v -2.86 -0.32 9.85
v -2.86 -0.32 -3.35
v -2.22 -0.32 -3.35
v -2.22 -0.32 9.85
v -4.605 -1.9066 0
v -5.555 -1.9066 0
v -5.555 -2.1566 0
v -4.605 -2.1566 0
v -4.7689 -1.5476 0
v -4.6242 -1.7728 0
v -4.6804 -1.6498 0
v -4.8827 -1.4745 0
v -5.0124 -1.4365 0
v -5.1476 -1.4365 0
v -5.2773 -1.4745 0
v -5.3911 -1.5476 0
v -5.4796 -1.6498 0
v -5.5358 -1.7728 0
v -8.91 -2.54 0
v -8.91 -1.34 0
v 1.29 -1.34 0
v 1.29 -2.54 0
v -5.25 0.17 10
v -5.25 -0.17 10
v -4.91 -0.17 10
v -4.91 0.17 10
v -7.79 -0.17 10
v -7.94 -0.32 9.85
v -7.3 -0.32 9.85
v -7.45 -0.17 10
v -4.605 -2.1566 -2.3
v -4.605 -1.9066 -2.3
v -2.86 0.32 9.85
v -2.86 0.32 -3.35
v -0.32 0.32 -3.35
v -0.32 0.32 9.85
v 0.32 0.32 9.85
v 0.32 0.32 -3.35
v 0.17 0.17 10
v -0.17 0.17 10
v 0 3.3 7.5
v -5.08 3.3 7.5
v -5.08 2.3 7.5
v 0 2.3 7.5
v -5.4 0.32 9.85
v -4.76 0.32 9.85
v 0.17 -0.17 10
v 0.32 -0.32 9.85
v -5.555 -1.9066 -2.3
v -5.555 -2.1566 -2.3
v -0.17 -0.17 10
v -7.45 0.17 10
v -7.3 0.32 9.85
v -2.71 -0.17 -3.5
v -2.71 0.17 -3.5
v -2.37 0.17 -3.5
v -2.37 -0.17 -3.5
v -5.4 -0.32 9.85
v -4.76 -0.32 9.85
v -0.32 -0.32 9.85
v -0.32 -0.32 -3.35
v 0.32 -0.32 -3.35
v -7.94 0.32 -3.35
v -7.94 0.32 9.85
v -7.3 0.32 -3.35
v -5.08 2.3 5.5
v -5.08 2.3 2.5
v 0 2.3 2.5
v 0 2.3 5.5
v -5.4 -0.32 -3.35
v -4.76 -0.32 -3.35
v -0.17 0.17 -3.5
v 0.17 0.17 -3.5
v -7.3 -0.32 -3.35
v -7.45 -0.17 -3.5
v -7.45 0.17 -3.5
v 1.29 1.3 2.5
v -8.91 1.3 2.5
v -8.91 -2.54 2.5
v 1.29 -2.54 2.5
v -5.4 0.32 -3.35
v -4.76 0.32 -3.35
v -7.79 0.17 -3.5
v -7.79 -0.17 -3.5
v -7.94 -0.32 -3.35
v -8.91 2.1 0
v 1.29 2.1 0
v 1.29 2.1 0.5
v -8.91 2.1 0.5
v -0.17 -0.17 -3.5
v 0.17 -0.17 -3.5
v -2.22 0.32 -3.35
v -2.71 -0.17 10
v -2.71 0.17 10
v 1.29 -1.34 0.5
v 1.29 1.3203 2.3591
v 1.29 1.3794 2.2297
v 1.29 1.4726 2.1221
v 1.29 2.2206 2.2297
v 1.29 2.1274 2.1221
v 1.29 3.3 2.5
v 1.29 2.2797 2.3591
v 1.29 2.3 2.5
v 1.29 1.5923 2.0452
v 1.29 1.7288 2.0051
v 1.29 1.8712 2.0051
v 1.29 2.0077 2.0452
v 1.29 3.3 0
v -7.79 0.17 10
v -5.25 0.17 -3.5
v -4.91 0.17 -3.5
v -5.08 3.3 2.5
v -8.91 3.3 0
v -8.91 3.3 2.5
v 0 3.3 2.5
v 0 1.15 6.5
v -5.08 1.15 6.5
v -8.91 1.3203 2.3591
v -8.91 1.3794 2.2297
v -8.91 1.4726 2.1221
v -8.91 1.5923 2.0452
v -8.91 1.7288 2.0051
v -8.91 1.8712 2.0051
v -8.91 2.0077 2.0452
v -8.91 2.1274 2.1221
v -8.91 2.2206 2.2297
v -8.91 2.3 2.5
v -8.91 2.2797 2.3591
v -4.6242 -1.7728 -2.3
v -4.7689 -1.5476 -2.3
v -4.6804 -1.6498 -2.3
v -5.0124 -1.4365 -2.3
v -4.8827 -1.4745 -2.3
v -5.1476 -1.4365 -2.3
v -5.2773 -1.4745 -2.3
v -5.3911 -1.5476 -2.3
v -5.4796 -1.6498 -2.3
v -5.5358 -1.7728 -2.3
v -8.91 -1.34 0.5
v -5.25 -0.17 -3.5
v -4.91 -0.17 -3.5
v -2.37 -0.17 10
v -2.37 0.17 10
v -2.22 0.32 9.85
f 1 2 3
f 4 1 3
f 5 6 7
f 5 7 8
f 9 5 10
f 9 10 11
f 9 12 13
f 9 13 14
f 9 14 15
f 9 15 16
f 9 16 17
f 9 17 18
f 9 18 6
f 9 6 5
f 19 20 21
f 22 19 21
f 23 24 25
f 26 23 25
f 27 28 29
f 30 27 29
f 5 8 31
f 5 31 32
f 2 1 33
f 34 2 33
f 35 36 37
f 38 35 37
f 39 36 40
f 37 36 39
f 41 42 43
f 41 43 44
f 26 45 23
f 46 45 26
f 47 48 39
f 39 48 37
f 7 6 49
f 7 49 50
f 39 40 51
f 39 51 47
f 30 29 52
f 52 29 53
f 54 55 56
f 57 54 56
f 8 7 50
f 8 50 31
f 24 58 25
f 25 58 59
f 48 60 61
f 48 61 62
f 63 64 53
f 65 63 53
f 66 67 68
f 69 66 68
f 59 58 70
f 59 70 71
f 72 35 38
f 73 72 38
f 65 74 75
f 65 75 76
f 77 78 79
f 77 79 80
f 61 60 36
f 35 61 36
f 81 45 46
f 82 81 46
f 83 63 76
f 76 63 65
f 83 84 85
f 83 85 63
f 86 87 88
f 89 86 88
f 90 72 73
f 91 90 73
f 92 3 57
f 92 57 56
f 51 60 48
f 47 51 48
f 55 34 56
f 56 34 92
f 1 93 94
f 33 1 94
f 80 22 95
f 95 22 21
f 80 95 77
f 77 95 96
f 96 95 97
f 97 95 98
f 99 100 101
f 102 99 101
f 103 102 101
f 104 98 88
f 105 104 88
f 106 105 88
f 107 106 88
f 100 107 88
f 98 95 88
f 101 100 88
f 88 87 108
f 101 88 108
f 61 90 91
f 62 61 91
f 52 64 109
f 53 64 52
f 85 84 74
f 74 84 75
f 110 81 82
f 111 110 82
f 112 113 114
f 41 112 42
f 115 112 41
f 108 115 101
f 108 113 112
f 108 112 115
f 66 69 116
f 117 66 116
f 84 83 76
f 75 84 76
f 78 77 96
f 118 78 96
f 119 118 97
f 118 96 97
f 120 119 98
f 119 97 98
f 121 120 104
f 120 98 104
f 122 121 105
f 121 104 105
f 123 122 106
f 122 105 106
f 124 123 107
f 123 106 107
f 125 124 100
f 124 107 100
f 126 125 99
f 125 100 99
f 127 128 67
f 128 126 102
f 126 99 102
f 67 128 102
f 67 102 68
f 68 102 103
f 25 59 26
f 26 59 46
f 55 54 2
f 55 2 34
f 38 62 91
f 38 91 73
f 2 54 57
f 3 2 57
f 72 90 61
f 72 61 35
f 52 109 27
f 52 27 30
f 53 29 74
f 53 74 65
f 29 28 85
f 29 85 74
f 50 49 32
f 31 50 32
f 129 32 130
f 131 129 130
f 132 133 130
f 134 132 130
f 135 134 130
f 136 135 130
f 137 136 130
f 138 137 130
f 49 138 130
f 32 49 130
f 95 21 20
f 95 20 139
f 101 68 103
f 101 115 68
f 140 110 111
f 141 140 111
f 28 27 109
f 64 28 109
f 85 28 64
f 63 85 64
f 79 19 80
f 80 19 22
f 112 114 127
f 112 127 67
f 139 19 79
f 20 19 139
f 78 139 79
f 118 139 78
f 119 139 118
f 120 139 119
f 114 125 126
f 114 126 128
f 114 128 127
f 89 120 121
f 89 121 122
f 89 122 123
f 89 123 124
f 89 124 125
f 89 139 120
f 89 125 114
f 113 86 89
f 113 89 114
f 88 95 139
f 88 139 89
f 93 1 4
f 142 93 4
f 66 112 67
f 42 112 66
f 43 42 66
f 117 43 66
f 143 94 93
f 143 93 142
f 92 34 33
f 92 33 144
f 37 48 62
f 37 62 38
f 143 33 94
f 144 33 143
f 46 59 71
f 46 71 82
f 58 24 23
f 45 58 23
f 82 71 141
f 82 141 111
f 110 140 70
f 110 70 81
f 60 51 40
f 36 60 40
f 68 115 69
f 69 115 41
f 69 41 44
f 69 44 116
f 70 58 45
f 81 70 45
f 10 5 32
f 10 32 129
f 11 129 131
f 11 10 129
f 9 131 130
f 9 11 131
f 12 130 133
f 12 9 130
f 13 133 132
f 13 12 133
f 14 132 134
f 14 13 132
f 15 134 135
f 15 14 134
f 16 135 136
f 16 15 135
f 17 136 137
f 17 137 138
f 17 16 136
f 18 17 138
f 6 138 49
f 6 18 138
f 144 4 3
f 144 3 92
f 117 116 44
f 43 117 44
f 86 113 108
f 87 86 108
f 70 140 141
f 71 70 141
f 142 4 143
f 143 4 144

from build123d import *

# Parameters (mm, degrees)
SKETCH_W          = 10.2
SKETCH_H          = 5.84
PAD_DEPTH         = 2.5
SKETCH001_W       = 5.08
SKETCH001_H       = 1
PAD001_DEPTH      = 5
PAD002_DEPTH      = 5.08
POCKET_DEPTH      = 10.201
SKETCH017_W       = 3.44
SKETCH017_H       = 0.5
POCKET001_DEPTH   = 10.201
PAD007_DEPTH      = 2.3
SKETCH011_W       = 0.64
SKETCH011_H       = 0.64
PAD003_DEPTH      = 10
PAD003_DEPTH_BACK = 3.5
CHAMFER_SIZE      = 0.15
CHAMFER004_SIZE   = 0.15
SKETCH012_W       = 0.64
SKETCH012_H       = 0.64
PAD004_DEPTH      = 10
PAD004_DEPTH_BACK = 3.5
CHAMFER001_SIZE   = 0.15
CHAMFER005_SIZE   = 0.15
SKETCH013_W       = 0.64
SKETCH013_H       = 0.64
PAD005_DEPTH      = 10
PAD005_DEPTH_BACK = 3.5
CHAMFER002_SIZE   = 0.15
CHAMFER006_SIZE   = 0.15
SKETCH014_W       = 0.64
SKETCH014_H       = 0.64
PAD006_DEPTH      = 10
PAD006_DEPTH_BACK = 3.5
CHAMFER003_SIZE   = 0.15
CHAMFER007_SIZE   = 0.15


with BuildPart() as pocket001:
    # Sketch → Pad (new body)
    with BuildSketch(Plane.XY):
        with Locations((-3.81, 0.38)):
            Rectangle(SKETCH_W, SKETCH_H)
    extrude(amount=PAD_DEPTH)

    # Sketch001 → Pad001 (new body)
    with BuildSketch(Plane.XY.offset(2.5)):
        with Locations((-2.54, 2.8)):
            Rectangle(SKETCH001_W, SKETCH001_H)
    extrude(amount=PAD001_DEPTH)

    # Sketch002 → Pad002 (new body)
    with BuildSketch(Plane.YZ):
        Polygon((2.3, 7.5), (2.3, 5.5), (1.15, 6.5), align=None)
    extrude(amount=-PAD002_DEPTH)

    # Sketch015 → Pocket (cut, through all)
    with BuildSketch(Plane.YZ.offset(1.29)):
        with BuildLine():
            ThreePointArc((1.3, 2.5), (1.8, 2), (2.3, 2.5))
            Line((1.3, 2.5), (2.3, 2.5))
        make_face()
    extrude(amount=-POCKET_DEPTH, mode=Mode.SUBTRACT)

    # Sketch017 → Pocket001 (cut, through all)
    with BuildSketch(Plane.YZ.offset(1.29)):
        with Locations((0.38, 0.25)):
            Rectangle(SKETCH017_W, SKETCH017_H)
    extrude(amount=-POCKET001_DEPTH, mode=Mode.SUBTRACT)


with BuildPart() as pad007:
    # Sketch018 → Pad007 (new body)
    with BuildSketch(Plane.XY):
        with BuildLine():
            Line((-4.605, -2.15662), (-4.605, -1.90662))
            ThreePointArc((-4.605, -1.90662), (-5.08, -1.43162), (-5.555, -1.90662))
            Line((-5.555, -1.90662), (-5.555, -2.15662))
            Line((-5.555, -2.15662), (-4.605, -2.15662))
        make_face()
    extrude(amount=-PAD007_DEPTH)


with BuildPart() as chamfer004:
    # Sketch011 → Pad003 (new body, two sides)
    with BuildSketch(Plane.XY) as pad003_sk:
        Rectangle(SKETCH011_W, SKETCH011_H)
    extrude(amount=PAD003_DEPTH)
    extrude(pad003_sk.sketch, amount=-PAD003_DEPTH_BACK)

    # Chamfer
    chamfer_edges = [chamfer004.edges().sort_by_distance(p)[0] for p in [
        (0, 0.32, 10),
        (0.32, 0, 10),
        (0, -0.32, 10),
        (-0.32, 0, 10),
    ]]
    chamfer(chamfer_edges, length=CHAMFER_SIZE)

    # Chamfer004
    chamfer004_edges = [chamfer004.edges().sort_by_distance(p)[0] for p in [
        (0, 0.32, -3.5),
        (0.32, 0, -3.5),
        (0, -0.32, -3.5),
        (-0.32, 0, -3.5),
    ]]
    chamfer(chamfer004_edges, length=CHAMFER004_SIZE)


with BuildPart() as chamfer005:
    # Sketch012 → Pad004 (new body, two sides)
    with BuildSketch(Plane.XY) as pad004_sk:
        with Locations((-2.54, 0)):
            Rectangle(SKETCH012_W, SKETCH012_H)
    extrude(amount=PAD004_DEPTH)
    extrude(pad004_sk.sketch, amount=-PAD004_DEPTH_BACK)

    # Chamfer001
    chamfer001_edges = [chamfer005.edges().sort_by_distance(p)[0] for p in [
        (-2.54, 0.32, 10),
        (-2.22, 0, 10),
        (-2.54, -0.32, 10),
        (-2.86, 0, 10),
    ]]
    chamfer(chamfer001_edges, length=CHAMFER001_SIZE)

    # Chamfer005
    chamfer005_edges = [chamfer005.edges().sort_by_distance(p)[0] for p in [
        (-2.54, 0.32, -3.5),
        (-2.22, 0, -3.5),
        (-2.54, -0.32, -3.5),
        (-2.86, 0, -3.5),
    ]]
    chamfer(chamfer005_edges, length=CHAMFER005_SIZE)


with BuildPart() as chamfer006:
    # Sketch013 → Pad005 (new body, two sides)
    with BuildSketch(Plane.XY) as pad005_sk:
        with Locations((-5.08, 0)):
            Rectangle(SKETCH013_W, SKETCH013_H)
    extrude(amount=PAD005_DEPTH)
    extrude(pad005_sk.sketch, amount=-PAD005_DEPTH_BACK)

    # Chamfer002
    chamfer002_edges = [chamfer006.edges().sort_by_distance(p)[0] for p in [
        (-5.08, 0.32, 10),
        (-4.76, 0, 10),
        (-5.08, -0.32, 10),
        (-5.4, 0, 10),
    ]]
    chamfer(chamfer002_edges, length=CHAMFER002_SIZE)

    # Chamfer006
    chamfer006_edges = [chamfer006.edges().sort_by_distance(p)[0] for p in [
        (-5.08, 0.32, -3.5),
        (-4.76, 0, -3.5),
        (-5.08, -0.32, -3.5),
        (-5.4, 0, -3.5),
    ]]
    chamfer(chamfer006_edges, length=CHAMFER006_SIZE)


with BuildPart() as chamfer007:
    # Sketch014 → Pad006 (new body, two sides)
    with BuildSketch(Plane.XY) as pad006_sk:
        with Locations((-7.62, 0)):
            Rectangle(SKETCH014_W, SKETCH014_H)
    extrude(amount=PAD006_DEPTH)
    extrude(pad006_sk.sketch, amount=-PAD006_DEPTH_BACK)

    # Chamfer003
    chamfer003_edges = [chamfer007.edges().sort_by_distance(p)[0] for p in [
        (-7.62, 0.32, 10),
        (-7.3, 0, 10),
        (-7.62, -0.32, 10),
        (-7.94, 0, 10),
    ]]
    chamfer(chamfer003_edges, length=CHAMFER003_SIZE)

    # Chamfer007
    chamfer007_edges = [chamfer007.edges().sort_by_distance(p)[0] for p in [
        (-7.62, 0.32, -3.5),
        (-7.3, 0, -3.5),
        (-7.62, -0.32, -3.5),
        (-7.94, 0, -3.5),
    ]]
    chamfer(chamfer007_edges, length=CHAMFER007_SIZE)


solid = Compound([pocket001.part, pad007.part, chamfer004.part, chamfer005.part, chamfer006.part, chamfer007.part])
